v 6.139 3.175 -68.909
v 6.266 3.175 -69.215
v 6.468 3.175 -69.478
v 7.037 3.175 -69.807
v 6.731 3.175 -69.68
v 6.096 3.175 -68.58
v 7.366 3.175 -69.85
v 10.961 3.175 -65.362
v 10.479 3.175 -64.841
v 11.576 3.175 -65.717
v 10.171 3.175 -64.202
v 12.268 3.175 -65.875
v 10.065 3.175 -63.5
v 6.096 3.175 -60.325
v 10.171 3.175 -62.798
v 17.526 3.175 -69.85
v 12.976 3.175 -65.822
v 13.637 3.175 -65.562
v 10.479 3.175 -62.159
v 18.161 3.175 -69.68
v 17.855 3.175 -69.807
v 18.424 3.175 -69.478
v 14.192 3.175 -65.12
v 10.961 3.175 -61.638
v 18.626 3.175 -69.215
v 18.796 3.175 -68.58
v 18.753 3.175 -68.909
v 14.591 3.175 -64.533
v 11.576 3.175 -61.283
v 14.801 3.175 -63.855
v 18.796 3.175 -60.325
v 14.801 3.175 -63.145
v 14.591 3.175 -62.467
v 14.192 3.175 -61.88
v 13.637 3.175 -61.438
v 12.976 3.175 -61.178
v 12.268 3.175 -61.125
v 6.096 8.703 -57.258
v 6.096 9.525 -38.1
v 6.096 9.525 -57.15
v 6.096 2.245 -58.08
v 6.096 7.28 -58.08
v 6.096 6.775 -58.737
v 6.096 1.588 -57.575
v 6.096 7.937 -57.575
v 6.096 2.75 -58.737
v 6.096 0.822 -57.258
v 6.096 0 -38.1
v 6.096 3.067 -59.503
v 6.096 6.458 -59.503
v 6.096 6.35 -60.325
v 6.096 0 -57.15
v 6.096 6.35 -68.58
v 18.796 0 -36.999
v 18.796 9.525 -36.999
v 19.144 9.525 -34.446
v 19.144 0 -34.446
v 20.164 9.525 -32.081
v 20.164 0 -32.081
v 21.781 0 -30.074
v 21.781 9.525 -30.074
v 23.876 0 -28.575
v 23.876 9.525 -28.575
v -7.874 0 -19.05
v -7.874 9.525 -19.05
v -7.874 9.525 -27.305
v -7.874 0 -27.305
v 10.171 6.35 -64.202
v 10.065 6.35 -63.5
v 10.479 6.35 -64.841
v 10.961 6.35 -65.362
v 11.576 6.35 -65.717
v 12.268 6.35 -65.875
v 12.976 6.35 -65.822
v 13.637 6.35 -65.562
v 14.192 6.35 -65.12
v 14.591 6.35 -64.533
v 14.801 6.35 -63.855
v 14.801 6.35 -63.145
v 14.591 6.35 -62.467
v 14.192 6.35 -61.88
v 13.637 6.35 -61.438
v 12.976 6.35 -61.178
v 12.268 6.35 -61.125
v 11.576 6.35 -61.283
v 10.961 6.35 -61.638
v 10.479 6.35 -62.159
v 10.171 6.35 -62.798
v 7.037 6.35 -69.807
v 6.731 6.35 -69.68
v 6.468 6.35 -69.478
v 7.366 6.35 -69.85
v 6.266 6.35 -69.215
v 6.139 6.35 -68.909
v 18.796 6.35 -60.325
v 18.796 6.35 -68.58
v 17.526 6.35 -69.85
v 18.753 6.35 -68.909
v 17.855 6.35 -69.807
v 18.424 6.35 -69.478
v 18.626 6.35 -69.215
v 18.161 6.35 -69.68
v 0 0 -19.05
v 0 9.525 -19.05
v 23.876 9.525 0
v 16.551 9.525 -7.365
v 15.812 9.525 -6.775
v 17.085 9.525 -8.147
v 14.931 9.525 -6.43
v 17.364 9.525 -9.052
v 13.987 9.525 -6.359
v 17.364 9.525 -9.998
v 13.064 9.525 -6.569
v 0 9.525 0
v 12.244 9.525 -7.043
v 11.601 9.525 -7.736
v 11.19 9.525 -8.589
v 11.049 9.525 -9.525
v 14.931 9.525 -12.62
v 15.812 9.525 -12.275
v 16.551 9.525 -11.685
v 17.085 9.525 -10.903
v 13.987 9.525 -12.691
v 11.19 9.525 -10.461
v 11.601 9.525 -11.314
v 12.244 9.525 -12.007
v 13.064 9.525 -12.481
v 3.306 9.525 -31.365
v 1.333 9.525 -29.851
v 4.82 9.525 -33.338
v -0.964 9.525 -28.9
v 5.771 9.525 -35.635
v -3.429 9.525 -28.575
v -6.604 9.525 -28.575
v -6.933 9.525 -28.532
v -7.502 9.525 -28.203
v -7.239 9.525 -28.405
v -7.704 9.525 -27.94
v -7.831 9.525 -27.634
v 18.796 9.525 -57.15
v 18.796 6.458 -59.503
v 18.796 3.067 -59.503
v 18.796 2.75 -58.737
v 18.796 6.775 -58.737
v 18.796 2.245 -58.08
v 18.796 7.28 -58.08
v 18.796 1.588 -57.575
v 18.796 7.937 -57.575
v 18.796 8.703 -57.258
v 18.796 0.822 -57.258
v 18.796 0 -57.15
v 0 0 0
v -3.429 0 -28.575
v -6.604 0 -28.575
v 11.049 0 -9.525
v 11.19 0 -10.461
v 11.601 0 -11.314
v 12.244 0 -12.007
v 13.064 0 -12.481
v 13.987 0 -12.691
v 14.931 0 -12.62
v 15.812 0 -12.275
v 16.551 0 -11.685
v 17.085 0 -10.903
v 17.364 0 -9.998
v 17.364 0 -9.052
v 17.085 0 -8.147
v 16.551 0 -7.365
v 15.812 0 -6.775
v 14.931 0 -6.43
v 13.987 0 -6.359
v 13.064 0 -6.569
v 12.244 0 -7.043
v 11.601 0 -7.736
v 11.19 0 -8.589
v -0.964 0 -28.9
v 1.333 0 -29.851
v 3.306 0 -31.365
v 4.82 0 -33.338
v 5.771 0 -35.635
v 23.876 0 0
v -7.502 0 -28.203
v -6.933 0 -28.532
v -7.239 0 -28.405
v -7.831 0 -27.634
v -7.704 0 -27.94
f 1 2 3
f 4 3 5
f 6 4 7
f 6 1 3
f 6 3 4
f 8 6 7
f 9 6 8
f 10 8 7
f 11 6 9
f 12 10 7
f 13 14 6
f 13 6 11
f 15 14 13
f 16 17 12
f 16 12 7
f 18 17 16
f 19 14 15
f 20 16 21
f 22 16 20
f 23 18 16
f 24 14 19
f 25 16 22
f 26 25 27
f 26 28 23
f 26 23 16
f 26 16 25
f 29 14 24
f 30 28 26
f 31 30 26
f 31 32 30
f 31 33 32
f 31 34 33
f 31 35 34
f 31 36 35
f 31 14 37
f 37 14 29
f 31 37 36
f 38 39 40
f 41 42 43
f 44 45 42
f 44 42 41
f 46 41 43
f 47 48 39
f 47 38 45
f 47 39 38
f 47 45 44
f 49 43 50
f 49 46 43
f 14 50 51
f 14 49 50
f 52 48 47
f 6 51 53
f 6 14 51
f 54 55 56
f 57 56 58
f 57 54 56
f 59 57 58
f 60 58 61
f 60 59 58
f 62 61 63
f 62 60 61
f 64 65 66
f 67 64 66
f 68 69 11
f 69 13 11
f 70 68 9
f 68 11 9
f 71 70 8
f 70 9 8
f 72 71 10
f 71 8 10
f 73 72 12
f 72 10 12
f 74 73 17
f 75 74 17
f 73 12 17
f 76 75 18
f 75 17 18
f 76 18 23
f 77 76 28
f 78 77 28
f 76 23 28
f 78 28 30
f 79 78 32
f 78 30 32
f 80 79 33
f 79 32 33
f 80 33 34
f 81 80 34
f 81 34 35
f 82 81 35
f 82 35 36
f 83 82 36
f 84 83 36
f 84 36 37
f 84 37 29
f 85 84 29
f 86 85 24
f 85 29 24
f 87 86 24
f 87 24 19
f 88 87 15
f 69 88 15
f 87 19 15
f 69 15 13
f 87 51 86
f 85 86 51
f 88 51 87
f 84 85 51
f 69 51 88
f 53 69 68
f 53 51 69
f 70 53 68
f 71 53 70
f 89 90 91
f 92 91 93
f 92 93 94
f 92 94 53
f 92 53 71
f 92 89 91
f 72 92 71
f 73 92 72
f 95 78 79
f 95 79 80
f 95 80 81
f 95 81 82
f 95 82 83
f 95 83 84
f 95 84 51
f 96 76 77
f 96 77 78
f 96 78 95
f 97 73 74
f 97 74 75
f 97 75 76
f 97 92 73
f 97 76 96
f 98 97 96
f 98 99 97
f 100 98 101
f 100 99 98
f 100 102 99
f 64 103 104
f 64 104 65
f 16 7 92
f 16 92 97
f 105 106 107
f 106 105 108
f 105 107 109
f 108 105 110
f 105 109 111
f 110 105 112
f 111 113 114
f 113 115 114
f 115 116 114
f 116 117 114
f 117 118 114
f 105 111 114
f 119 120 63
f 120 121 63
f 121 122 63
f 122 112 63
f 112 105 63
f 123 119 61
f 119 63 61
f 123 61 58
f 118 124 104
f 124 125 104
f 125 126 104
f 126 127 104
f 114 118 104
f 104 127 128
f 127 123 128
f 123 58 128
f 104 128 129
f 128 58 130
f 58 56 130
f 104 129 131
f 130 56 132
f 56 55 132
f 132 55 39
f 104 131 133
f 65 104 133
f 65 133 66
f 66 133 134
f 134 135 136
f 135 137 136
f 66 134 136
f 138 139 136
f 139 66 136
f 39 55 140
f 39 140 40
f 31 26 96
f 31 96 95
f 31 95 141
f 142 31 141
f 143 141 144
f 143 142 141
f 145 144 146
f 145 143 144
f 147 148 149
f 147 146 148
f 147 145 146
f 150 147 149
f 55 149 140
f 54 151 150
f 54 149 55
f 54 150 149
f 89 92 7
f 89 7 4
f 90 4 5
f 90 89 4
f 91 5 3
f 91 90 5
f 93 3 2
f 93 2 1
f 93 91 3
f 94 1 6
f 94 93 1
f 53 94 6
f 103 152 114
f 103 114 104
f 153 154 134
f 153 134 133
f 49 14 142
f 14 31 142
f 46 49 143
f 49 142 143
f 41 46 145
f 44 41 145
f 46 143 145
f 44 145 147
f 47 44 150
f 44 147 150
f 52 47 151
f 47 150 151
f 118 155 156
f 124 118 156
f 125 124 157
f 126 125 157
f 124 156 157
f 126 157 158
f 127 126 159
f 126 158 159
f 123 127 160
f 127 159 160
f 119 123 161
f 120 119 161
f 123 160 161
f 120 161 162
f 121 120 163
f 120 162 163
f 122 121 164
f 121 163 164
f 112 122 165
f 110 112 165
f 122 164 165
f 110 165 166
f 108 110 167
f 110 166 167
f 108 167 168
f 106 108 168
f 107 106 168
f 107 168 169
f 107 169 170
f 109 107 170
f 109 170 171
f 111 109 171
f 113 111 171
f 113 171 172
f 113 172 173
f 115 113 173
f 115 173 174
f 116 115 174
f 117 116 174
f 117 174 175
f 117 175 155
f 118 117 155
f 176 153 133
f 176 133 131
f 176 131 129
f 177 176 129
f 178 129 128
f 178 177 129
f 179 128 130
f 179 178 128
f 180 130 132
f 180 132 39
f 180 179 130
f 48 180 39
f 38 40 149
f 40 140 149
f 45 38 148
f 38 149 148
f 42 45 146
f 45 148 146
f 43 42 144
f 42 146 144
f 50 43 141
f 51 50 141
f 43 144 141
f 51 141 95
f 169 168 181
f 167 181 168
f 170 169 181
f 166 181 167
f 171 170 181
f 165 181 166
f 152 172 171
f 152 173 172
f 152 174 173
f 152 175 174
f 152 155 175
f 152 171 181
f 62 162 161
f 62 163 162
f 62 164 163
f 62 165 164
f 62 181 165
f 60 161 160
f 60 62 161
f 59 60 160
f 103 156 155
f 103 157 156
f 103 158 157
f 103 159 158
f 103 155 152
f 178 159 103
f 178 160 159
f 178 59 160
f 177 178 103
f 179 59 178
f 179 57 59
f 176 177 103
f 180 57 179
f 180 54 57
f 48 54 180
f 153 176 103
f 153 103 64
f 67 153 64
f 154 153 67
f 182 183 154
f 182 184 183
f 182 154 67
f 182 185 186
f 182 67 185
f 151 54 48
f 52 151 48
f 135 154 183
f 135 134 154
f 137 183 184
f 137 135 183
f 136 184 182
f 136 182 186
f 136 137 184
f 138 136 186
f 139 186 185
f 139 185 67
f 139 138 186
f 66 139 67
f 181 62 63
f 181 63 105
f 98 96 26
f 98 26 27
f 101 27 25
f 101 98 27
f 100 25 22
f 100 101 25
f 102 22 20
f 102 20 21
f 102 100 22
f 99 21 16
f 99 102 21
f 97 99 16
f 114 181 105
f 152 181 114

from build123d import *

# Parameters (mm, degrees)
STOCK_DEPTH        = 9.525
MOUNTING_HOLE_D    = 6.35
SPRING_HOLE_D      = 4.7625
FILLET3_R          = 9.525
FILLET4_R          = 1.27
SKETCH15_W         = 12.7
SKETCH15_H         = 12.7
CUT_EXTRUDE1_DEPTH = 3.175
SKETCH16_W         = 12.7
SKETCH16_H         = 12.7
CUT_EXTRUDE2_DEPTH = 3.175
FILLET5_R          = 3.175


# Some blends are built 0.0001 mm under size
with BuildPart() as part:
    # Sketch7 → Stock (new body)
    with BuildSketch(Plane(origin=(0, 0, 0), x_dir=(1, 0, 0), z_dir=(0, 1, 0))):
        Polygon((0, 0), (0, 19.05), (-7.874, 19.05), (-7.874, 28.575), (6.096, 28.575), (6.096, 69.85), (18.796, 69.85), (18.796, 28.575), (23.876, 28.575), (23.876, 0), align=None)
    extrude(amount=STOCK_DEPTH)

    # Mounting Hole (through all)
    with Locations(Plane(origin=(0, 9.525, 0), x_dir=(1, 0, 0), z_dir=(0, 1, 0))):
        with Locations((14.224, 9.525)):
            Hole(MOUNTING_HOLE_D / 2)

    # Spring Hole (through all)
    with Locations(Plane(origin=(0, 9.525, 0), x_dir=(1, 0, 0), z_dir=(0, 1, 0))):
        with Locations((12.446, 63.5)):
            Hole(SPRING_HOLE_D / 2)

    # Fillet3
    # the kernel refuses this fillet: 9.525 mm, written as the material it adds along each edge
    with BuildSketch(Plane(origin=(6.096, 0, -28.575), x_dir=(-1, 0, 0), z_dir=(0, 1, 0))) as fillet3_piece_1:
        with BuildLine():
            CenterArc((FILLET3_R, -FILLET3_R), FILLET3_R, 90, 90)
            Line((0, -FILLET3_R), (-FILLET3_R * 0.02, -FILLET3_R))
            Line((-FILLET3_R * 0.02, -FILLET3_R), (-FILLET3_R * 0.02, FILLET3_R * 0.02))
            Line((-FILLET3_R * 0.02, FILLET3_R * 0.02), (FILLET3_R, FILLET3_R * 0.02))
            Line((FILLET3_R, FILLET3_R * 0.02), (FILLET3_R, 0))
        make_face()
    extrude(amount=9.525)
    with BuildSketch(Plane(origin=(18.796, 0, -28.575), x_dir=(1, 0, 0), z_dir=(0, 1, 0))) as fillet3_piece_2:
        with BuildLine():
            CenterArc((9.525, 8.424226968), FILLET3_R, 180, 62.181860715)
            Line((0, 8.424226968), (-0.1905, 8.424226968))
            Line((-0.1905, 8.424226968), (-0.1905, 0))
            Line((-0.1905, 0), (0, -0.1905))
            ThreePointArc((0, -0.1905), (2.54, -0.1905), (4.9911, -0.168484539))
            Line((4.9911, -0.168484539), (5.08, 0))
        make_face()
    extrude(amount=9.525)

    # Fillet4
    fillet4_edges = [part.edges().sort_by_distance(p)[0] for p in [
        (-7.874, 4.7625, -28.575),
        (6.096, 4.7625, -69.85),
        (18.796, 4.7625, -69.85),
    ]]
    fillet(fillet4_edges, radius=FILLET4_R)

    # Sketch15 → Cut-Extrude1 (cut)
    with BuildSketch(Plane(origin=(0, 9.525, 0), x_dir=(1, 0, 0), z_dir=(0, 1, 0))):
        with Locations((12.446, 63.5)):
            Rectangle(SKETCH15_W, SKETCH15_H)
    extrude(amount=-CUT_EXTRUDE1_DEPTH, mode=Mode.SUBTRACT)

    # Sketch16 → Cut-Extrude2 (cut)
    with BuildSketch(Plane.XZ):
        with Locations((12.446, -63.5)):
            Rectangle(SKETCH16_W, SKETCH16_H)
    extrude(amount=-CUT_EXTRUDE2_DEPTH, mode=Mode.SUBTRACT)

    # Fillet5
    fillet5_edges = [part.edges().sort_by_distance(p)[0] for p in [
        (12.446, 3.175, -57.15),
        (12.446, 6.35, -57.15),
    ]]
    fillet(fillet5_edges, radius=FILLET5_R - 0.0001)  # a hair under: the kernel refuses the full size


solid = part.part
